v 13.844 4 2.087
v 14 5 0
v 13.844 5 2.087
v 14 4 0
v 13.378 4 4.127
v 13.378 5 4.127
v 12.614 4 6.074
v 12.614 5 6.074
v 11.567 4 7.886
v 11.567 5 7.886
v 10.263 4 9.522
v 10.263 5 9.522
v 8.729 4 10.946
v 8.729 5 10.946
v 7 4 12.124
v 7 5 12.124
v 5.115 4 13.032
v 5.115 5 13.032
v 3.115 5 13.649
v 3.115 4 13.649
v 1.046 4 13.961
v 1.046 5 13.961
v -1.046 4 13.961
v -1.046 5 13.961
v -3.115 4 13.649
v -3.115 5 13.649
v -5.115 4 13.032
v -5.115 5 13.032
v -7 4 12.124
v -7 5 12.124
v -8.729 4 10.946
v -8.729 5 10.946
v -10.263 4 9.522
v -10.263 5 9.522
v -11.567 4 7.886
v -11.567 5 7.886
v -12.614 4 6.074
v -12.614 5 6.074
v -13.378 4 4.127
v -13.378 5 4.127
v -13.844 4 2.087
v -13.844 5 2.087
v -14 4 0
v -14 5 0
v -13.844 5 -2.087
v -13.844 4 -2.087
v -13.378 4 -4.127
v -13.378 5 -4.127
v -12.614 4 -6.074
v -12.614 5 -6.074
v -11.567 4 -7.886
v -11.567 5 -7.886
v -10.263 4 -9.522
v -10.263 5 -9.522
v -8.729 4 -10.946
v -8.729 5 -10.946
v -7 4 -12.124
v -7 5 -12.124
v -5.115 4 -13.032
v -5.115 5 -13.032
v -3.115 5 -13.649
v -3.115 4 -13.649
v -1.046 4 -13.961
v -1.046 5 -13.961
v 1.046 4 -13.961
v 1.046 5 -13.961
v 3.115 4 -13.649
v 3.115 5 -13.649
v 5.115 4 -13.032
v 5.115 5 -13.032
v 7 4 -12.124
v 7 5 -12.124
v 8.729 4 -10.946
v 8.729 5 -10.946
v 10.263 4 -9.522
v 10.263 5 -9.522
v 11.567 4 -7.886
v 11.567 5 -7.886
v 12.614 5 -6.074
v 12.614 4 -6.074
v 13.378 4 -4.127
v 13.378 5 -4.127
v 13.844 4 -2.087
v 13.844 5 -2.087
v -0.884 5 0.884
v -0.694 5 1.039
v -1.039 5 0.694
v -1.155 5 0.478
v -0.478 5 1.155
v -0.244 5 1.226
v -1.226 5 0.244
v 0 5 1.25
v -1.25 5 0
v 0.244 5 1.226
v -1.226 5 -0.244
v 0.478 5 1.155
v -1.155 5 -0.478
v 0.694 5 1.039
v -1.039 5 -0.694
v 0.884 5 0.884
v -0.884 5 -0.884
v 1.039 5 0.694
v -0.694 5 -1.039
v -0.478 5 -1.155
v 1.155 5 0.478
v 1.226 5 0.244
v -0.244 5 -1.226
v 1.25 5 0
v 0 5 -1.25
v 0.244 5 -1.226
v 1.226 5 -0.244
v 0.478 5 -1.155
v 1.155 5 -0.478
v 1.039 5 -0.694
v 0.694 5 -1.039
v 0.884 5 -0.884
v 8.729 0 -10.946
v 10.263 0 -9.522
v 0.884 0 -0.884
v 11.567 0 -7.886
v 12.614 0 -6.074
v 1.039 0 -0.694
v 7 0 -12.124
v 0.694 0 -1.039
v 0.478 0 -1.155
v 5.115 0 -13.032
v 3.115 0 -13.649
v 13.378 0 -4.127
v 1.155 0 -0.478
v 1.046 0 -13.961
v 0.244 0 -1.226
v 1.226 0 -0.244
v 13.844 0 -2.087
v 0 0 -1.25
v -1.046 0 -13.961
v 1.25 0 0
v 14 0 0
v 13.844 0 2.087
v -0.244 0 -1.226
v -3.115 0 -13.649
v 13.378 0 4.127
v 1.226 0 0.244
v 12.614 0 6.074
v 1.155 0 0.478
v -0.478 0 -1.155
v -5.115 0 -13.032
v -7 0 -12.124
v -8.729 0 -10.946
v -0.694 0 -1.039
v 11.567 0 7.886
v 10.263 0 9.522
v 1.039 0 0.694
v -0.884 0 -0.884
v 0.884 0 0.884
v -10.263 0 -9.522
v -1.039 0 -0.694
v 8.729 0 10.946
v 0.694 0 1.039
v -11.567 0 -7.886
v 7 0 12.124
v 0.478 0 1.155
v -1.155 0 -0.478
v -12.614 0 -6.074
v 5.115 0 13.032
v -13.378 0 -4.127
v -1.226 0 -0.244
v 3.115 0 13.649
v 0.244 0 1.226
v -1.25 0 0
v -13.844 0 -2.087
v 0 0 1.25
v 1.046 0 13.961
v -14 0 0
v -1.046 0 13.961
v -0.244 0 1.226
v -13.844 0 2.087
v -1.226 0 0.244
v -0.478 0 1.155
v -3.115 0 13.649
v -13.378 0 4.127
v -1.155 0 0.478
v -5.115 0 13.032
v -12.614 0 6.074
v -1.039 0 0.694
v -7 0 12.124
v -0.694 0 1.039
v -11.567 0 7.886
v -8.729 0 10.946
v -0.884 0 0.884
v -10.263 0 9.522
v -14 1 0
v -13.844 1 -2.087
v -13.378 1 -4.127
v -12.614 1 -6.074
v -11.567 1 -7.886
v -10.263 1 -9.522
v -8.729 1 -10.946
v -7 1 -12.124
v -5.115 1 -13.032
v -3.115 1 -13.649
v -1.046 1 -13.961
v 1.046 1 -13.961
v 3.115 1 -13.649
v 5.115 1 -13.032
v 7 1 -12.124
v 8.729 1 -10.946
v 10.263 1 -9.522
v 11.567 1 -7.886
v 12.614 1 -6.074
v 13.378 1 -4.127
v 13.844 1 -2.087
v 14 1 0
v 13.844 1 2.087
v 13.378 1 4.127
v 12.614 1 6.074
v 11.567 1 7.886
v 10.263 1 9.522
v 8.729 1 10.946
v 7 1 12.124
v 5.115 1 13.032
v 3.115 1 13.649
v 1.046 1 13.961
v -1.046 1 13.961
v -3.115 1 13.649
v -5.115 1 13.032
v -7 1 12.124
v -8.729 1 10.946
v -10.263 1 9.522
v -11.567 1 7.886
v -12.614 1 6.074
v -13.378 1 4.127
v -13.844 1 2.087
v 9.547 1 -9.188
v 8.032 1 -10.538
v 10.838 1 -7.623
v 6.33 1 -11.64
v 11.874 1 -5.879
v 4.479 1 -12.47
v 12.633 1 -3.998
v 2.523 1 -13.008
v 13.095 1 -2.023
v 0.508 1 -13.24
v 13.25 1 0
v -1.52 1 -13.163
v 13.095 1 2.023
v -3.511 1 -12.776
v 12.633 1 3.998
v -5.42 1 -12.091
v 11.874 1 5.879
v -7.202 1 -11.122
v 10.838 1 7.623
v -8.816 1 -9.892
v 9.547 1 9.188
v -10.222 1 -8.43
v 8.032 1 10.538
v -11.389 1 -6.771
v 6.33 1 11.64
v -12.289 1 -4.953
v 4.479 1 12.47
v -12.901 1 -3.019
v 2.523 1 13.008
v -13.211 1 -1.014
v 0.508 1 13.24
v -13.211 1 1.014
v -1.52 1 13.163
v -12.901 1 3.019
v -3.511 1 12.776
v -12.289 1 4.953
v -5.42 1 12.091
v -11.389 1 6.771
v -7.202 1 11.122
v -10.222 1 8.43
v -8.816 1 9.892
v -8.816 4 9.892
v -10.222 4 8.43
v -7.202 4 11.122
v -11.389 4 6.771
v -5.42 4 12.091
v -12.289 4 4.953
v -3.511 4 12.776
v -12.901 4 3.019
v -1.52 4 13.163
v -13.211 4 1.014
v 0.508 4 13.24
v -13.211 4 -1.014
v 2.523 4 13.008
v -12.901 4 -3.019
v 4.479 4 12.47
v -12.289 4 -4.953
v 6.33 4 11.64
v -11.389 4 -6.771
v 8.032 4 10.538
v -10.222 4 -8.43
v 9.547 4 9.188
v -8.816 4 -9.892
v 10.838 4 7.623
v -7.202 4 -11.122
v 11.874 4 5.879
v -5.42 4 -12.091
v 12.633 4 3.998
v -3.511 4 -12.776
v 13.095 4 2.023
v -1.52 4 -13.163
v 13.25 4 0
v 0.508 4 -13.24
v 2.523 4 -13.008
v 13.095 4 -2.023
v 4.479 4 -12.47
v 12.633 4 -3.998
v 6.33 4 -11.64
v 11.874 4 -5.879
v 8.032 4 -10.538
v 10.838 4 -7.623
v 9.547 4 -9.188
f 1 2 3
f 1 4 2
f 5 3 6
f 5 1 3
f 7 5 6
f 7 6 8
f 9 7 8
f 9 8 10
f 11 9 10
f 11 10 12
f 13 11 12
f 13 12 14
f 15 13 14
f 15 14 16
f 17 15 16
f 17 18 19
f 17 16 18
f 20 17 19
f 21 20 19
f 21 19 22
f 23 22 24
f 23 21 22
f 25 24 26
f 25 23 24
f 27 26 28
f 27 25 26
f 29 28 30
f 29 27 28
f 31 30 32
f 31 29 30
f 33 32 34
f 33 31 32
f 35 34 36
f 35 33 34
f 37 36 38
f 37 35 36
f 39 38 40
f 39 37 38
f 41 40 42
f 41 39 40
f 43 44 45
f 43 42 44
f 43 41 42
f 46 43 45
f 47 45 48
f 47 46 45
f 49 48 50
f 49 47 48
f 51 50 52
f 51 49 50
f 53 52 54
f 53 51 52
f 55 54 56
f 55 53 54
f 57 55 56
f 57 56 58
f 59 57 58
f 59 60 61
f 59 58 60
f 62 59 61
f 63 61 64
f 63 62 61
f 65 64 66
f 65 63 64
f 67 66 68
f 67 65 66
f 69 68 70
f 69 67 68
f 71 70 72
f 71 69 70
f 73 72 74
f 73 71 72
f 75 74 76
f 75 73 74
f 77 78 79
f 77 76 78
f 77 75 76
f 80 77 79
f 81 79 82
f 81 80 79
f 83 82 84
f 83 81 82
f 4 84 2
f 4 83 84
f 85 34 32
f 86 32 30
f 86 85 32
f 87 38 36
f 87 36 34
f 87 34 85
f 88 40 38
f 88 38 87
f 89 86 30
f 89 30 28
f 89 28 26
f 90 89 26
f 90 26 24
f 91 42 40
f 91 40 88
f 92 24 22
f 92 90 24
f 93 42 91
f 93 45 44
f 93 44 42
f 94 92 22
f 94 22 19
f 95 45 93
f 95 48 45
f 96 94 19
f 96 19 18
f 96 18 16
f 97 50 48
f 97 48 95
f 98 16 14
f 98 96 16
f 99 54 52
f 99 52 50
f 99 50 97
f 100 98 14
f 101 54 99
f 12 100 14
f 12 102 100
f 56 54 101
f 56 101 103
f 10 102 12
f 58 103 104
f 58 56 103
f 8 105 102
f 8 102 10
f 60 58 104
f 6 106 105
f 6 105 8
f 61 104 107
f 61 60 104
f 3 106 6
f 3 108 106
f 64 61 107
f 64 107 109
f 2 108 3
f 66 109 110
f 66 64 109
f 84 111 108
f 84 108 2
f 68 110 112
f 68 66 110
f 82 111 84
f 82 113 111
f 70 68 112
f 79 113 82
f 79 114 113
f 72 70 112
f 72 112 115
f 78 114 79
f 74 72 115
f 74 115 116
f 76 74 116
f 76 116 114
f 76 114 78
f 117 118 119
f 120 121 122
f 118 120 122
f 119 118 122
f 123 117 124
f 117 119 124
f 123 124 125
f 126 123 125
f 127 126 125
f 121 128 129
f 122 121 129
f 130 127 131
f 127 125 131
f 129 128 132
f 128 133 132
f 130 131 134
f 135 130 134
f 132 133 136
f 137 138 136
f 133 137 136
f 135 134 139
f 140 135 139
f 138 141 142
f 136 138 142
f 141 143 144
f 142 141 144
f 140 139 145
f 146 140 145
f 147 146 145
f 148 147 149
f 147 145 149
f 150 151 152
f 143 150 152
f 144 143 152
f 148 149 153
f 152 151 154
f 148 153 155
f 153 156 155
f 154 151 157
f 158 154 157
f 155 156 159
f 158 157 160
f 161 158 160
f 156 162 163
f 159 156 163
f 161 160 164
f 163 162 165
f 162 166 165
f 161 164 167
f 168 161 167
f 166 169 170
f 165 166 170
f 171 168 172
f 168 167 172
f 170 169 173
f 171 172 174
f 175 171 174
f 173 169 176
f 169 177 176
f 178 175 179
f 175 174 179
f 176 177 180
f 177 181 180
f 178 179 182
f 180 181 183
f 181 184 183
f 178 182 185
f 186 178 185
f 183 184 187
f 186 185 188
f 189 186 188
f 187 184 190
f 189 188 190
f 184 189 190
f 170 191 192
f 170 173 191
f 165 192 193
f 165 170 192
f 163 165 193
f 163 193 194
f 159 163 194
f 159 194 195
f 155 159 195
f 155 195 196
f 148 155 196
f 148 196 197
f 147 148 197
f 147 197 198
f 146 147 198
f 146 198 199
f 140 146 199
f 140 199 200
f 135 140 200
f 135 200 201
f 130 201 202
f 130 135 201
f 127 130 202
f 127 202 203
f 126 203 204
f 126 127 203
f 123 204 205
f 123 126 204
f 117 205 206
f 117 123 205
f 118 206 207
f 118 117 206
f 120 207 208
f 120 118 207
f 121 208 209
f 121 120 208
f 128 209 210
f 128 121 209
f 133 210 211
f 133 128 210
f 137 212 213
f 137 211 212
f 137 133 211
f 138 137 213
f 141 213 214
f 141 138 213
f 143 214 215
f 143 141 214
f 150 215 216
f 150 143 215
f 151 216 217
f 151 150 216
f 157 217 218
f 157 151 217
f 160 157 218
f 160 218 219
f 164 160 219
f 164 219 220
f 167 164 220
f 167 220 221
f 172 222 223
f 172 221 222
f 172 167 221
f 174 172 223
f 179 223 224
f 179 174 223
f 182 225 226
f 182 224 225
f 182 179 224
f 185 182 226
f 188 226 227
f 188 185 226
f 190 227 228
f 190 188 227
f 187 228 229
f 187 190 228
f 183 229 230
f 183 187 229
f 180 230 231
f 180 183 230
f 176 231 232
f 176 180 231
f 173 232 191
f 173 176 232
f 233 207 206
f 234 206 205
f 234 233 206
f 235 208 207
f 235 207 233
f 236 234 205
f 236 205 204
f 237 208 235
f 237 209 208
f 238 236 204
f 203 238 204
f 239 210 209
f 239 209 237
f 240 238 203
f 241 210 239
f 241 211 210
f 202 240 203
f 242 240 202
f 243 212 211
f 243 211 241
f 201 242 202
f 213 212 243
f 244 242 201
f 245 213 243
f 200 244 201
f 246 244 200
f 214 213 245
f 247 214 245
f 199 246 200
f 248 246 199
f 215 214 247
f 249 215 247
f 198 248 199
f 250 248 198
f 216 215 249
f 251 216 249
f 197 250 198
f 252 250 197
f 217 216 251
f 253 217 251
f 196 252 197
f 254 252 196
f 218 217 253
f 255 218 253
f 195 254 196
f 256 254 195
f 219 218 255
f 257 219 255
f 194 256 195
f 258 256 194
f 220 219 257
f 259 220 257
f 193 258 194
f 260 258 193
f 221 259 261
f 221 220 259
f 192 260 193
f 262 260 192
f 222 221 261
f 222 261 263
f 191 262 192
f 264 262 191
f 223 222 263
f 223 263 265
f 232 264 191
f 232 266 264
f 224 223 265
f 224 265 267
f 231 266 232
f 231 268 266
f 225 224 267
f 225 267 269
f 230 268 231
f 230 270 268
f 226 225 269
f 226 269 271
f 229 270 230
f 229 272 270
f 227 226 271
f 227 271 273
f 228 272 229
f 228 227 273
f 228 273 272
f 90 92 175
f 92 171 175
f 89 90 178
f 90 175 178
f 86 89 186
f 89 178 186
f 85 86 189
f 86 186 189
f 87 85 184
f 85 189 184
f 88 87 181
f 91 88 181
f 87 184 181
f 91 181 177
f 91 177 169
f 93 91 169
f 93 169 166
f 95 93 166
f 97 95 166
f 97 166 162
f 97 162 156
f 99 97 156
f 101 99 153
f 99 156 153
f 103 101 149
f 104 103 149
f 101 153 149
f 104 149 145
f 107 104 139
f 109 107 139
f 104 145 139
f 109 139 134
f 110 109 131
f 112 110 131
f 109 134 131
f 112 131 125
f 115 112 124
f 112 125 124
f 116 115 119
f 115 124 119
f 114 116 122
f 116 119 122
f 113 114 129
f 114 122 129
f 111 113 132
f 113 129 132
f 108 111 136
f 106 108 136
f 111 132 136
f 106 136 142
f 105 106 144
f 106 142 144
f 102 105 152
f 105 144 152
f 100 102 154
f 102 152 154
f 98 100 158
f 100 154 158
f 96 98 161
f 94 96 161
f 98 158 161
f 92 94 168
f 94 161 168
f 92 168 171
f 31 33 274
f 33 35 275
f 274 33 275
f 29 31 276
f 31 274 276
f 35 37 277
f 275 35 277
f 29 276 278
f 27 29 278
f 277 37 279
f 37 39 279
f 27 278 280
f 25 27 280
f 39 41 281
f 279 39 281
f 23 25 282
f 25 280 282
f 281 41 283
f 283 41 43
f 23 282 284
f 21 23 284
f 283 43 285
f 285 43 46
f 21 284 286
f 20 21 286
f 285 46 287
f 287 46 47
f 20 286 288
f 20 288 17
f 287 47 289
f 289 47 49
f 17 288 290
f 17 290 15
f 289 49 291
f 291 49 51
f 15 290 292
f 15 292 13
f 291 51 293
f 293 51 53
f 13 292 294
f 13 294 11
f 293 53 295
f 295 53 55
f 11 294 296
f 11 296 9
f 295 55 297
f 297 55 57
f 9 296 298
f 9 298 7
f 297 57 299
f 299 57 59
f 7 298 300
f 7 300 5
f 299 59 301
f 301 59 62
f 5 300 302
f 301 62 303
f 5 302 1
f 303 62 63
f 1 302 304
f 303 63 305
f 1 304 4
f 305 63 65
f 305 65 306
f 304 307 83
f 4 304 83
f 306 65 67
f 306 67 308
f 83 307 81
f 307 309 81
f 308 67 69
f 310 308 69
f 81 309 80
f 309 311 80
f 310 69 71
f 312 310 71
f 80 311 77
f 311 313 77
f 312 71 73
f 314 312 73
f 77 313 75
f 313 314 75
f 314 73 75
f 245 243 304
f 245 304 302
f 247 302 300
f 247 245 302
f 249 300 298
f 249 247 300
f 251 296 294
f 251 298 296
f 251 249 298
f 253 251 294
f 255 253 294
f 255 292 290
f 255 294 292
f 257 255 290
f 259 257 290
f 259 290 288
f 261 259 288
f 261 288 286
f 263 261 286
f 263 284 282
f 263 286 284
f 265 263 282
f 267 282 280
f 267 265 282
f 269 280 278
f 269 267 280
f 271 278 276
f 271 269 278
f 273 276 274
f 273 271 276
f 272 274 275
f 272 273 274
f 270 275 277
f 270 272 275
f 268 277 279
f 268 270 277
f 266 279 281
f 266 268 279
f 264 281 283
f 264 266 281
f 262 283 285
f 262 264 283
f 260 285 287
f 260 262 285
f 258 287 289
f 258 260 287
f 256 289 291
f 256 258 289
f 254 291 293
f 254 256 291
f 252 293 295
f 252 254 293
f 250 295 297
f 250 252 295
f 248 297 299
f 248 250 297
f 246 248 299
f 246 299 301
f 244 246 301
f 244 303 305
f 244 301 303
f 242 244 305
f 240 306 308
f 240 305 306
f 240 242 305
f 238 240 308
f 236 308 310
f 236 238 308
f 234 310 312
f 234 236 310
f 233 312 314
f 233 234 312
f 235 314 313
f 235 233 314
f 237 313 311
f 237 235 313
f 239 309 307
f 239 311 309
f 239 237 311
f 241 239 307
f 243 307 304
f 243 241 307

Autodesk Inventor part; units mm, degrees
ref_plane "YZ Plane" through (0, 0, 0) normal (1, 0, 0) x (0, 1, 0)
ref_plane "XZ Plane" through (0, 0, 0) normal (0, 1, 0) x (-1, 0, 0)
ref_plane "XY Plane" through (0, 0, 0) normal (0, 0, 1) x (1, 0, 0)
sketch "Sketch1" plane through (0, 0, 0) normal (0, 1, 0) x (-1, 0, 0)
  circle A0 centre (0, 0) radius 14
  circle A1 centre (0, 0) radius 14
  dimension "d0" = 28
extrude "Extrusion1" add sketch "Sketch1" along normal blind 1
sketch "Sketch2" plane through (0, 1, 0) normal (0, 1, 0) x (1, 0, 0)
  circle A0 centre (0, 0) radius 13.25
  dimension "d4" = 26.5
extrude "Extrusion2" add sketch "Sketch2" along normal blind 3
sketch "Sketch3" plane through (0, 4, 0) normal (0, 1, 0) x (1, 0, 0)
  circle A0 centre (0, 0) radius 14
  dimension "d7" = 28
extrude "Extrusion3" add sketch "Sketch3" along normal blind 1
sketch "Sketch4" plane through (0, 5, 0) normal (0, 1, 0) x (1, 0, 0)
  circle A0 centre (0, 0) radius 1.25
  dimension "d10" = 2.5
hole "Hole1" at (0, 5, 0) direction (0, -1, 0) diameter 2.5 end through all
equation "\"d16\" = Thickness"
equation "\"BendRadius\" = Thickness"
equation "\"BendReliefWidth\" = Thickness"
equation "\"BendReliefDepth\" = 0.5 * Thickness"
equation "\"CornerReliefSize\" = 4 * Thickness"
equation "\"MinimumRemnant\" = 2 * Thickness"
equation "\"TransitionRadius\" = BendRadius"
equation "\"JacobiRadiusSize\" = BendRadius"
equation "\"GapSize\" = Thickness"
equation "\"Thickness\" = 0.5"
properties part number "wheeltemplate"
